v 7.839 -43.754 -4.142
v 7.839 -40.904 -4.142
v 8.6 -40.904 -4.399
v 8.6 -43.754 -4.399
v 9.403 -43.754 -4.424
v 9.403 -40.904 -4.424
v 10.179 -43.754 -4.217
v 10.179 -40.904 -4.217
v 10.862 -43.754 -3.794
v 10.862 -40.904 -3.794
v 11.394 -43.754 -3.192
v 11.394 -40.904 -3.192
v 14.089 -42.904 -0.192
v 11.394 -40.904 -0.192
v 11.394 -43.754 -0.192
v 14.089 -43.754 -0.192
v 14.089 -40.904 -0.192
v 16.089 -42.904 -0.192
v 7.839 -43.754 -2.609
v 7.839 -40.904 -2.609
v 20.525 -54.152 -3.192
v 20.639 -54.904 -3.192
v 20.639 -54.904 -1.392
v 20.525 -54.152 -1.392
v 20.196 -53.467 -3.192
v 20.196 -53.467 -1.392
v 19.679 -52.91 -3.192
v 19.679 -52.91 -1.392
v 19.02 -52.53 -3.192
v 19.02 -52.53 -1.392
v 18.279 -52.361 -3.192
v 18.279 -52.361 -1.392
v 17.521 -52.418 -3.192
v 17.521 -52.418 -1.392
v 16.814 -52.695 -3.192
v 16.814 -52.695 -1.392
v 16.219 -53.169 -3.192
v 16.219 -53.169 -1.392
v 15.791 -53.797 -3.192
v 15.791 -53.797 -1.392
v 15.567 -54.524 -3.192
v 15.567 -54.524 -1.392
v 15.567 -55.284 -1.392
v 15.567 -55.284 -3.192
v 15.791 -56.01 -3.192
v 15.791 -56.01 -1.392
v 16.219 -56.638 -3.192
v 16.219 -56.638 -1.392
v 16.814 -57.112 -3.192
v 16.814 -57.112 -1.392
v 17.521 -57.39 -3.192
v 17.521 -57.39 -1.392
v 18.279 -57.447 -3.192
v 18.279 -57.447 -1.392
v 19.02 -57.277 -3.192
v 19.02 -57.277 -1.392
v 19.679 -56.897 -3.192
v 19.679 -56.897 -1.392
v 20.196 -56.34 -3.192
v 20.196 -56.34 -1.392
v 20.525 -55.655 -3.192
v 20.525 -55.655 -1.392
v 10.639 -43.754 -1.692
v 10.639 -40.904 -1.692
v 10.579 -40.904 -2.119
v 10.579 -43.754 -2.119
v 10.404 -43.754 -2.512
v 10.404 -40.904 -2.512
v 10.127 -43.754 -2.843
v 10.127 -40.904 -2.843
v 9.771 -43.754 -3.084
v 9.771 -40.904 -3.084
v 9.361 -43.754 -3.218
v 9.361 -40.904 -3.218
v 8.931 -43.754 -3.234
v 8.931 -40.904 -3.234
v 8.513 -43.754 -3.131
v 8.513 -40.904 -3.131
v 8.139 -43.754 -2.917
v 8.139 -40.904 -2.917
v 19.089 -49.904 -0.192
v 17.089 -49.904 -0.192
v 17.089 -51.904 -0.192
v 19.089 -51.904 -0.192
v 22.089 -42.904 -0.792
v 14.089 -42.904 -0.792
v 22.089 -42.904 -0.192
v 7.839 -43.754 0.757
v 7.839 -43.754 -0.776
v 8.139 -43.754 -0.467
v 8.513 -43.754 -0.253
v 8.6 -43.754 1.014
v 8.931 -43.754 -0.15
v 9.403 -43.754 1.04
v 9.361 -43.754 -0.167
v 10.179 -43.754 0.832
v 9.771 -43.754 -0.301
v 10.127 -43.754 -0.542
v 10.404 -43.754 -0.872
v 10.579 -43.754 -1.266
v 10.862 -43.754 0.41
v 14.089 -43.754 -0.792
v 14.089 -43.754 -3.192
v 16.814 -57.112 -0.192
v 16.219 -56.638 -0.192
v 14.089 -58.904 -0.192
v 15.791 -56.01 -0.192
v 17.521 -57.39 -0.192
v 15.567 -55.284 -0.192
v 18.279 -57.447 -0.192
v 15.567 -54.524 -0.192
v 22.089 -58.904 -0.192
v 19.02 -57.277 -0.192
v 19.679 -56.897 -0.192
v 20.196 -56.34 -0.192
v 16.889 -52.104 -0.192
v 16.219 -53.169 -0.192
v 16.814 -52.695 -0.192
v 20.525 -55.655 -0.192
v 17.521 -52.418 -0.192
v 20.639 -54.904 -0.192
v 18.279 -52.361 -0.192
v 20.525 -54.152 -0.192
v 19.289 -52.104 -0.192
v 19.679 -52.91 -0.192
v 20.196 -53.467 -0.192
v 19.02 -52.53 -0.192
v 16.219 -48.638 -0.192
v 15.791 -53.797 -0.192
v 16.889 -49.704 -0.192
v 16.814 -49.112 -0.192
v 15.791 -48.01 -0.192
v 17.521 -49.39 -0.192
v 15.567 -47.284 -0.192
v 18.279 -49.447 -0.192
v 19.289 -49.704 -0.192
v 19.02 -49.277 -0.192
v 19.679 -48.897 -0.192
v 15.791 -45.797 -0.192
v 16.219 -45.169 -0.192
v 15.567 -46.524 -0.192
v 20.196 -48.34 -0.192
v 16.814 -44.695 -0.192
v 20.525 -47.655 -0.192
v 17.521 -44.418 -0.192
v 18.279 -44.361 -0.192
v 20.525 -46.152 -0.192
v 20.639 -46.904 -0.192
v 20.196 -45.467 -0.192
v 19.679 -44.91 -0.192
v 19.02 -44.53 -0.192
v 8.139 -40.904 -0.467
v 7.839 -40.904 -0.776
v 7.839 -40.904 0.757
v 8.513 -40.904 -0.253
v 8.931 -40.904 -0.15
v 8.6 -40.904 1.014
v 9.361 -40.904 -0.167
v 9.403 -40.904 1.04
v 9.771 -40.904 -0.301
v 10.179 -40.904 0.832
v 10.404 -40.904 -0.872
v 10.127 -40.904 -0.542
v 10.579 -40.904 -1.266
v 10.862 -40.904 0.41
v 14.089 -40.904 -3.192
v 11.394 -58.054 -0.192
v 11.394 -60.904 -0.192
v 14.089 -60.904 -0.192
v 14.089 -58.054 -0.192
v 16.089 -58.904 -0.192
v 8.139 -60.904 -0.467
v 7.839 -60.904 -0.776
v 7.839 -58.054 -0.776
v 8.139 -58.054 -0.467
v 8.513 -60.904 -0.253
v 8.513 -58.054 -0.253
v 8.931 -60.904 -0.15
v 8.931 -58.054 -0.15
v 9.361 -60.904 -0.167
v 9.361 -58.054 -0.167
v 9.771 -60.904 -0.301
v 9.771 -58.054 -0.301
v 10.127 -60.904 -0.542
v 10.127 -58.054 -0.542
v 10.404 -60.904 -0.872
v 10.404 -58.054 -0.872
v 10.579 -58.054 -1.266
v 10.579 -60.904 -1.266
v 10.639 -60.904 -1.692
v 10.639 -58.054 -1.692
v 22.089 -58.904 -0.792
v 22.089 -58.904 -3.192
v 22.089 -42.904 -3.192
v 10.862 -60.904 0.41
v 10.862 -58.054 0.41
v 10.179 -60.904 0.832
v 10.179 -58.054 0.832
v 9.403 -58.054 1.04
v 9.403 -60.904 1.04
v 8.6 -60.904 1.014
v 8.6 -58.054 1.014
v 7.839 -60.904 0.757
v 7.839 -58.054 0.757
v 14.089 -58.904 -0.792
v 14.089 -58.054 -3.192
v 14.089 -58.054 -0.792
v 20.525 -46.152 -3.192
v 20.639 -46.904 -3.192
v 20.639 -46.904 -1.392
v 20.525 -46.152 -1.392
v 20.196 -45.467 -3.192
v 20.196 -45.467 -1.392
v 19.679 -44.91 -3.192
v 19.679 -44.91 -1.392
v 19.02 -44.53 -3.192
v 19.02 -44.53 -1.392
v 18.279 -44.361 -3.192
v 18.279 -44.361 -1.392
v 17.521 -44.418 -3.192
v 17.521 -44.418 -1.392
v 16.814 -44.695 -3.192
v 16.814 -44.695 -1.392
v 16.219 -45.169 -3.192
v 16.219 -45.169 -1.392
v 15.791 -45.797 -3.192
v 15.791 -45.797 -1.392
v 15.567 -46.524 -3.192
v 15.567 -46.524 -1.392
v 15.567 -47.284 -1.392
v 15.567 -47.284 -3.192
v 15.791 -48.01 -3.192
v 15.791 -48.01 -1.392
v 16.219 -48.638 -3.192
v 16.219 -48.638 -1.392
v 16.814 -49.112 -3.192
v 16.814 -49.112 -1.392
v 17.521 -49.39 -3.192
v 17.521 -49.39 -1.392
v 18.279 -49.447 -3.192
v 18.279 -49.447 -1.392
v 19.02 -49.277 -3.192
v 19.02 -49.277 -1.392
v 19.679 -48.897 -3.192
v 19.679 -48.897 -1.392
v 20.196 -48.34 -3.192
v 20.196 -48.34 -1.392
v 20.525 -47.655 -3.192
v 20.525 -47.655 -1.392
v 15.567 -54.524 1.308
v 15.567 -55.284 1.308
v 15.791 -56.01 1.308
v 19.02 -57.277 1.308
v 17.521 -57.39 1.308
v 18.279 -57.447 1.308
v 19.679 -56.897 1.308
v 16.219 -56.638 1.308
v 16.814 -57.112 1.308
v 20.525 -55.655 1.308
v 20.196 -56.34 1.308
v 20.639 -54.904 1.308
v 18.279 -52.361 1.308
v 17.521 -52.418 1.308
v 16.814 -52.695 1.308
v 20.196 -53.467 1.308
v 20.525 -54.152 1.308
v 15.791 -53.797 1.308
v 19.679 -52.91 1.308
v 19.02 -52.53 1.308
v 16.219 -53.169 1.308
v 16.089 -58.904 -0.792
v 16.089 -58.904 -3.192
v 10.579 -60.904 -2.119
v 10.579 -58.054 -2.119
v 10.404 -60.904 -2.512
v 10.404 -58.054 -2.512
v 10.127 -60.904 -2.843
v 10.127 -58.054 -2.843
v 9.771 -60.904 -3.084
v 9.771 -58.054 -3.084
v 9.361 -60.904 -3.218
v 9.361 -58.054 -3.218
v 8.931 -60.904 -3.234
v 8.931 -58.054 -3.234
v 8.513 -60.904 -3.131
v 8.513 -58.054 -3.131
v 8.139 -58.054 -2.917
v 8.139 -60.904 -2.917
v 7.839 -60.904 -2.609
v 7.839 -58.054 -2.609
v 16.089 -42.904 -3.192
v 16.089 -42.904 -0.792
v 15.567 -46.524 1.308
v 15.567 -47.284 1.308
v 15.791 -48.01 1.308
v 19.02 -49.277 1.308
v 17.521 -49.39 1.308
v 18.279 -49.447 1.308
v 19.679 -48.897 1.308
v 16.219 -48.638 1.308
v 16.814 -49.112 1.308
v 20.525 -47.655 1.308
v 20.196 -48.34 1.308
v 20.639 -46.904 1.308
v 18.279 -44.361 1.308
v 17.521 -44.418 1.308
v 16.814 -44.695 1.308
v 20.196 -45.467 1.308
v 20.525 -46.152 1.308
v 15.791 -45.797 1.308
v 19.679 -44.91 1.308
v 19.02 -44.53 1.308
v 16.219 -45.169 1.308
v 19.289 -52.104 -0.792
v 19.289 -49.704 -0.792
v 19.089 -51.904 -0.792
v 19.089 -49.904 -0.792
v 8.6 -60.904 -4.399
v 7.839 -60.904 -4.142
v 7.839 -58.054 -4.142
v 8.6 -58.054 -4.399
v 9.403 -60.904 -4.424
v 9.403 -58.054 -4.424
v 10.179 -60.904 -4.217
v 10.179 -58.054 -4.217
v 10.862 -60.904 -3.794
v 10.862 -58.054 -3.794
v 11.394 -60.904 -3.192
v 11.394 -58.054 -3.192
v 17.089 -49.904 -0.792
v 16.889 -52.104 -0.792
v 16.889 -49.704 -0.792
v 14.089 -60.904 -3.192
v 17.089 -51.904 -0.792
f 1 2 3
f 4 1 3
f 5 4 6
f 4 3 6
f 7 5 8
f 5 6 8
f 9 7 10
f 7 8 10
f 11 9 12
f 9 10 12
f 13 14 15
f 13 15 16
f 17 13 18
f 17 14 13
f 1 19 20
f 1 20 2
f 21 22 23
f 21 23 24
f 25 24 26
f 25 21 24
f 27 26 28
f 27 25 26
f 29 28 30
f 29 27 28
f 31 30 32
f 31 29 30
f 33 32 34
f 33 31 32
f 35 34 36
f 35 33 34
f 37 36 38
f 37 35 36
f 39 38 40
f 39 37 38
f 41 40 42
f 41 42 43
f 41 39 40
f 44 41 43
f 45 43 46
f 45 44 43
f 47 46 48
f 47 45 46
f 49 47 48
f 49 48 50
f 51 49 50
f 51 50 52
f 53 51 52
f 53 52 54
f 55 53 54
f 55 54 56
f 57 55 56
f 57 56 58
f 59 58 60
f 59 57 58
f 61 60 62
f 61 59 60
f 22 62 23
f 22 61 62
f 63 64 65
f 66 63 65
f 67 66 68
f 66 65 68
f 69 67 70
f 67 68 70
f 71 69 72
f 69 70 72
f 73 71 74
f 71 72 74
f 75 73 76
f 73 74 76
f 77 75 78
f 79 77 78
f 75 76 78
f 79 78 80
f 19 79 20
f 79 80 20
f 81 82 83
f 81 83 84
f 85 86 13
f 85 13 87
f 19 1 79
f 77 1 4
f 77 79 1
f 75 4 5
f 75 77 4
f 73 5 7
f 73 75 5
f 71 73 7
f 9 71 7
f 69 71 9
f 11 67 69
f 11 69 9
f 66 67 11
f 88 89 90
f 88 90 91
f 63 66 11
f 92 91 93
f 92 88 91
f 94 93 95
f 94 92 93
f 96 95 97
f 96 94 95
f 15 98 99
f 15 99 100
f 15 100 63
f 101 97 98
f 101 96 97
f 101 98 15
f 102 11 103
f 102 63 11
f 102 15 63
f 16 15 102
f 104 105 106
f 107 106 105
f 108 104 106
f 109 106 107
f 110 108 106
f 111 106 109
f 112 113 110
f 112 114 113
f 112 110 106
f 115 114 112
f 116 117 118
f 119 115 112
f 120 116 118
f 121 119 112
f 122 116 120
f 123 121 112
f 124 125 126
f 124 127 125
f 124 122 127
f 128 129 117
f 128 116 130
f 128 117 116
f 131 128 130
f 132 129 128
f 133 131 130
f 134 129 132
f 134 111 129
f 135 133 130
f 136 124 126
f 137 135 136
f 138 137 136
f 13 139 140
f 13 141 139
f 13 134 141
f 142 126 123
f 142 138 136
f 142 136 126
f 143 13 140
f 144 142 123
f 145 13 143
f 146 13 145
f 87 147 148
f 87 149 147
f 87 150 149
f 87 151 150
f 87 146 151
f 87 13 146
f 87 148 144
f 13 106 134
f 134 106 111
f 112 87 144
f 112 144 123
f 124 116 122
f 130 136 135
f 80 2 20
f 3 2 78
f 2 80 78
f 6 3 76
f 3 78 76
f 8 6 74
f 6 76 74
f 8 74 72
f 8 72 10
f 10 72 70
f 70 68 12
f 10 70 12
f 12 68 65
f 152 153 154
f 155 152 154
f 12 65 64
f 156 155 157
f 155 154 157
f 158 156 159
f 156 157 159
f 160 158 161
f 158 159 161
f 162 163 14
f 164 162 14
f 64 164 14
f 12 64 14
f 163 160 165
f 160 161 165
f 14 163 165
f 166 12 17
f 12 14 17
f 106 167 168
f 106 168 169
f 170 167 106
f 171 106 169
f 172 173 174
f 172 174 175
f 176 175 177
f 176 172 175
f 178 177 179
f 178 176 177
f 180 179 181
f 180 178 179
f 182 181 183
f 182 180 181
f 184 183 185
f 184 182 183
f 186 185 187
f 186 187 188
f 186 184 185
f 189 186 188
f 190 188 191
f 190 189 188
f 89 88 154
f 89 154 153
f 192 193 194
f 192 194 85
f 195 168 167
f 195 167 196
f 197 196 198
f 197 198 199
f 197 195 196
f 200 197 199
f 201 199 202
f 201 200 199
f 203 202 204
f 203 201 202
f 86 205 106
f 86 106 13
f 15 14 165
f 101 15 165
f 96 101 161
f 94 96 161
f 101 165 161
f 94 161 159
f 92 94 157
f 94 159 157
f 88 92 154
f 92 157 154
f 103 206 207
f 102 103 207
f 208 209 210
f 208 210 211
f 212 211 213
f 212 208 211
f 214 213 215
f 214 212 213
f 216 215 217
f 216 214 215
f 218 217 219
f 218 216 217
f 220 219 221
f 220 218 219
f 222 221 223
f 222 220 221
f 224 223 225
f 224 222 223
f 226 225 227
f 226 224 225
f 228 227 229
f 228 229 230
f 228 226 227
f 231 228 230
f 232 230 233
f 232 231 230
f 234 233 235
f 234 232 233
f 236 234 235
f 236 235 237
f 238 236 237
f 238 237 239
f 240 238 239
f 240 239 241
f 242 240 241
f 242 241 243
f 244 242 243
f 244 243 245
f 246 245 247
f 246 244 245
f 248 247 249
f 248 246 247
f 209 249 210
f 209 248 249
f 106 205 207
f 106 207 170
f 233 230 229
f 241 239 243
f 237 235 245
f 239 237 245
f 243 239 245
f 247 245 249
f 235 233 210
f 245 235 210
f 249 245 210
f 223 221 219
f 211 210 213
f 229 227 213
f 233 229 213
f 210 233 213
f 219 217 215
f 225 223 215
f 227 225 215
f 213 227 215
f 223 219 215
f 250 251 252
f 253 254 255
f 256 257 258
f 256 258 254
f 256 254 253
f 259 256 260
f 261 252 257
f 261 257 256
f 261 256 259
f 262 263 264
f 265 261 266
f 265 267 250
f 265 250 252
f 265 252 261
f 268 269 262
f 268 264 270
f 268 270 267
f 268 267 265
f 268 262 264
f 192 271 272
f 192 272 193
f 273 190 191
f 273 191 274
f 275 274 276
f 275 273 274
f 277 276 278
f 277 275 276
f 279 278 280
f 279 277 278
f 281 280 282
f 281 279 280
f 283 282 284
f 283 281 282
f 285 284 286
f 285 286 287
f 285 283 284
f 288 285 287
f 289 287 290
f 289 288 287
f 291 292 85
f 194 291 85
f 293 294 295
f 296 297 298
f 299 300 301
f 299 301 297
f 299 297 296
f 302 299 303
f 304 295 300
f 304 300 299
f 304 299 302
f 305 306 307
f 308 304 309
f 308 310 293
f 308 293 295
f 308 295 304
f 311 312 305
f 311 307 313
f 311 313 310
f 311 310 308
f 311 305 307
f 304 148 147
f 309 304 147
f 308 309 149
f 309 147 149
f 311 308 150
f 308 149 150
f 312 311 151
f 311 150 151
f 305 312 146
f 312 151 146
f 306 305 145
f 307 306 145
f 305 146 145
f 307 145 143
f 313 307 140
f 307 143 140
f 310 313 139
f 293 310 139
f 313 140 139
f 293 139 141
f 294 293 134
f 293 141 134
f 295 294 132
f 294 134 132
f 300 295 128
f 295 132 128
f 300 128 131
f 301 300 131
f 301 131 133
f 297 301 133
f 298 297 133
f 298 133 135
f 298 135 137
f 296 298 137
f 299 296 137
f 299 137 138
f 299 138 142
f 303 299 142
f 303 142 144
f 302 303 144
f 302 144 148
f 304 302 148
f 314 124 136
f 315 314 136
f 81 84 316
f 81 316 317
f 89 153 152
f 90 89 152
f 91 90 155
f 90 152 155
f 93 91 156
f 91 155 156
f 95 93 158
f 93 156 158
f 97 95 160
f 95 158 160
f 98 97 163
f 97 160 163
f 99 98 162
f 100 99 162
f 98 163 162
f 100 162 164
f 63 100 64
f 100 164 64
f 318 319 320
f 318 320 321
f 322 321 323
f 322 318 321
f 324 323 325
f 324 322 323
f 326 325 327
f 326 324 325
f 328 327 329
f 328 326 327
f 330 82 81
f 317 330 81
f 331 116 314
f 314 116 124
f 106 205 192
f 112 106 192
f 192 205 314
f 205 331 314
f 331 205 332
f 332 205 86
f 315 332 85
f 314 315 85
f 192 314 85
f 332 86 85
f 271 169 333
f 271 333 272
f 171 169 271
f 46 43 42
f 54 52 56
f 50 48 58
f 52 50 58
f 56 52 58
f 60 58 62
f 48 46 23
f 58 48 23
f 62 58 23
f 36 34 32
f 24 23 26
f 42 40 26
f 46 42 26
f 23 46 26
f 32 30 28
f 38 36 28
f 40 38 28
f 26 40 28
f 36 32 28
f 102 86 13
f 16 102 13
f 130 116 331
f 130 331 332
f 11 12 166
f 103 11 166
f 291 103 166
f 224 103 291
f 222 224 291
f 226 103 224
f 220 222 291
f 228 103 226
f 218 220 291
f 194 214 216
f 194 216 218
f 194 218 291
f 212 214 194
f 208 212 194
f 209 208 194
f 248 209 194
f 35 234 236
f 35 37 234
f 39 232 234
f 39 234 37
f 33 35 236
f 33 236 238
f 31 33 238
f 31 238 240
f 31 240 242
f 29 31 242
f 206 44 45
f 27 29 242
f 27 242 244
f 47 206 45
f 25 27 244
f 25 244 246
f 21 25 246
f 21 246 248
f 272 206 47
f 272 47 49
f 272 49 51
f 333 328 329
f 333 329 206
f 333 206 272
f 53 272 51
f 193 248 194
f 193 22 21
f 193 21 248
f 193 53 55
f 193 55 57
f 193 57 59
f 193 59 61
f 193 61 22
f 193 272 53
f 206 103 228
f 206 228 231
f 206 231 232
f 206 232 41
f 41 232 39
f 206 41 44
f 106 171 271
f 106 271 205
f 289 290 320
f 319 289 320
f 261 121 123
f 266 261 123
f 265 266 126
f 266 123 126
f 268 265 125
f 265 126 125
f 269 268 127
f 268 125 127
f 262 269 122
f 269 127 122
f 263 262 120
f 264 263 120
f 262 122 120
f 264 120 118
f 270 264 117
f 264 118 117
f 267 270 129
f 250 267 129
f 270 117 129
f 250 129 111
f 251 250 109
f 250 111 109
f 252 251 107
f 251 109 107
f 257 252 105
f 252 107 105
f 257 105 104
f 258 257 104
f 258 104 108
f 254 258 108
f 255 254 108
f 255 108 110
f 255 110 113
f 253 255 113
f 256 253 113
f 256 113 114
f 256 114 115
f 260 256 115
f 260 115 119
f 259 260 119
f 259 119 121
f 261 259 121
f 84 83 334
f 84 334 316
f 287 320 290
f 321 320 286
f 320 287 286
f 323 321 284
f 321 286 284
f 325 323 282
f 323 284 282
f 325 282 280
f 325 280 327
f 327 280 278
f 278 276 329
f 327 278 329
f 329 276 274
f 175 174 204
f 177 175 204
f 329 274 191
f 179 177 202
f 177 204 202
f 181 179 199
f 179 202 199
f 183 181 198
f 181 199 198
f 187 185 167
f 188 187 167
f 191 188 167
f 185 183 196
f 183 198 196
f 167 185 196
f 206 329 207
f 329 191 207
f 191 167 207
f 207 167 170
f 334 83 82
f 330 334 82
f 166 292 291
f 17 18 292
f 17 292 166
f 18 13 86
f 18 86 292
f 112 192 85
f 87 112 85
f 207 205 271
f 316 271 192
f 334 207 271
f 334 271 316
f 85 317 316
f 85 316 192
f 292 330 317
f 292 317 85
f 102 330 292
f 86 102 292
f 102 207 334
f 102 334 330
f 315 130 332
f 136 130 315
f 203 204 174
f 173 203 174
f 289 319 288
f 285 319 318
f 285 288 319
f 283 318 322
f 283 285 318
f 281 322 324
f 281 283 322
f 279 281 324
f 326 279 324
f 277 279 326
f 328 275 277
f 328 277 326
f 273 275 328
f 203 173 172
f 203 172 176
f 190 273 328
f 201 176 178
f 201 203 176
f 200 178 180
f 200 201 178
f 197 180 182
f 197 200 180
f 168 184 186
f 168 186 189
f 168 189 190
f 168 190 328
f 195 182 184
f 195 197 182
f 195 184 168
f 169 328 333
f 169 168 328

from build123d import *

# Parameters (mm, degrees)
BOSS_EXTRUDE1_DEPTH = 2.85
BOSS_EXTRUDE2_START = -10
SKETCH1_3_W         = 8
SKETCH1_3_H         = 3
BOSS_EXTRUDE2_DEPTH = 8
SKETCH2_R           = 2.55
BOSS_EXTRUDE3_DEPTH = 1.5
CUT_EXTRUDE1_START  = -3
SKETCH2_4_R         = 2.55
CUT_EXTRUDE1_DEPTH  = 1.8
SPLIT1_START        = -0.792385575
SPLIT1_OUTLINE_R    = 2.55
SPLIT1_DEPTH        = 2.1
SPLIT1_2_OUTLINE_W  = 8
SPLIT1_2_OUTLINE_H  = 16
SPLIT1_2_OUTLINE_R  = 2.55
SPLIT1_2_DEPTH      = 0.6
SPLIT1_START_2      = 14.088625645
SPLIT1_3_OUTLINE_W  = 16
SPLIT1_3_OUTLINE_H  = 2.1
SPLIT1_3_DEPTH      = 8
SKETCH3_W           = 2.4
SKETCH3_H           = 2.4
SKETCH3_W_2         = 2
SKETCH3_H_2         = 2
CUT_EXTRUDE2_DEPTH  = 65.924847621
BOSS_EXTRUDE4_REACH = 66.925
SKETCH3_3_W         = 2
SKETCH3_3_H         = 2
BOSS_EXTRUDE5_REACH = 66.925


# Read off the part's stored shape, not the designer's step: Split1
with BuildPart() as part:
    # Sketch1 → Boss-Extrude1 (new body)
    with BuildSketch(Plane.XZ.offset(60.903743363)):
        with BuildLine():
            ThreePointArc((11.39351176, -0.192385575), (9.798258558, 0.964477449), (7.838625645, 0.757104168))
            Line((7.838625645, 0.757104168), (7.838625645, -0.775870436))
            ThreePointArc((7.838625645, -0.775870436), (9.570808183, -0.219293589), (10.638625645, -1.692385575))
            ThreePointArc((10.638625645, -1.692385575), (9.570808183, -3.165477561), (7.838625645, -2.608900714))
            Line((7.838625645, -2.608900714), (7.838625645, -4.141875318))
            ThreePointArc((7.838625645, -4.141875318), (9.798258558, -4.349248599), (11.39351176, -3.192385575))
            ThreePointArc((11.39351176, -3.192385575), (11.724999748, -2.474710055), (11.838625645, -1.692385575))
            ThreePointArc((11.838625645, -1.692385575), (11.724999748, -0.910061094), (11.39351176, -0.192385575))
        make_face()
        with BuildLine():
            Line((14.088625645, -0.192385575), (11.39351176, -0.192385575))
            ThreePointArc((11.39351176, -0.192385575), (11.724999748, -0.910061094), (11.838625645, -1.692385575))
            ThreePointArc((11.838625645, -1.692385575), (11.724999748, -2.474710055), (11.39351176, -3.192385575))
            Line((11.39351176, -3.192385575), (14.088625645, -3.192385575))
            Line((14.088625645, -3.192385575), (14.088625645, -0.192385575))
        make_face()
    extrude(amount=-BOSS_EXTRUDE1_DEPTH)


with BuildPart() as body_2:
    # Mirror3: mirrored copy
    add(part.part.mirror(Plane(origin=(0, -50.903743363, 0), x_dir=(0, 0, 1), z_dir=(0, -1, 0))))


with BuildPart() as part_1:
    add(part.part)

    add(body_2.part)  # Boss-Extrude2 merges body 2
    # Sketch1<3> → Boss-Extrude2 (add, symmetric)
    with BuildSketch(Plane.XZ.offset(60.903743363).offset(BOSS_EXTRUDE2_START)):
        with Locations((18.088625645, -1.692385575)):
            Rectangle(SKETCH1_3_W, SKETCH1_3_H)
    extrude(amount=BOSS_EXTRUDE2_DEPTH, both=True)

    # Sketch2 → Boss-Extrude3 (add)
    with BuildSketch(Plane.XY.offset(-0.192385575)):
        with Locations((18.088625645, -54.903743363)):
            Circle(SKETCH2_R)
        with Locations((18.088625645, -46.903743363)):
            Circle(SKETCH2_R)
    extrude(amount=BOSS_EXTRUDE3_DEPTH)

    # Sketch2<4> → Cut-Extrude1 (cut)
    with BuildSketch(Plane.XY.offset(-0.192385575).offset(CUT_EXTRUDE1_START)):
        with Locations((18.088625645, -54.903743363)):
            Circle(SKETCH2_4_R)
        with Locations((18.088625645, -46.903743363)):
            Circle(SKETCH2_4_R)
    extrude(amount=CUT_EXTRUDE1_DEPTH, mode=Mode.SUBTRACT)

    # Split1 3 outline → Split1 3 (cut)
    with BuildSketch(Plane.YZ.offset(SPLIT1_START_2)):
        with Locations((-50.903743363, 0.257614425)):
            Rectangle(SPLIT1_3_OUTLINE_W, SPLIT1_3_OUTLINE_H)
    extrude(amount=SPLIT1_3_DEPTH, mode=Mode.SUBTRACT)

    # Sketch3<3> → Boss-Extrude4 (add, up to next)
    with BuildSketch(Plane.XY.offset(-0.192385575), mode=Mode.PRIVATE) as boss_extrude4_sk1:
        with Locations((18.088625645, -50.903743363)):
            Rectangle(SKETCH3_3_W, SKETCH3_3_H)
    boss_extrude4_tool1 = extrude(boss_extrude4_sk1.sketch, amount=-BOSS_EXTRUDE4_REACH, mode=Mode.PRIVATE) - part_1.part
    add(boss_extrude4_tool1.solids().sort_by_distance((18.088626, -50.903743, -0.192386))[0])

    # Boss-Extrude5: up to this face of the body (flat: up to its plane)
    boss_extrude5_end = Plane(part_1.part.faces().sort_by_distance((17.287207403, -50.903743363, -3.192385575))[0])
    # Sketch2<6> → Boss-Extrude5 (add, up to the picked face)
    with BuildSketch(Plane.XY.offset(-0.192385575), mode=Mode.PRIVATE) as boss_extrude5_sk1:
        Polygon((14.088625645, -58.903743363), (14.088625645, -60.903743363), (16.088625645, -58.903743363), align=None)
    boss_extrude5_tool1 = split(extrude(boss_extrude5_sk1.sketch, amount=-BOSS_EXTRUDE5_REACH, mode=Mode.PRIVATE), bisect_by=boss_extrude5_end, keep=Keep.BOTH, mode=Mode.PRIVATE)
    # Sketch2<6> → Boss-Extrude5 (add, up to the picked face)
    with BuildSketch(Plane.XY.offset(-0.192385575), mode=Mode.PRIVATE) as boss_extrude5_sk2:
        Polygon((16.088625645, -42.903743363), (14.088625645, -40.903743363), (14.088625645, -42.903743363), align=None)
    boss_extrude5_tool2 = split(extrude(boss_extrude5_sk2.sketch, amount=-BOSS_EXTRUDE5_REACH, mode=Mode.PRIVATE), bisect_by=boss_extrude5_end, keep=Keep.BOTH, mode=Mode.PRIVATE)
    add(boss_extrude5_tool1.solids().sort_by(Axis((14.755292, -59.57041, -0.192386), (0, 0, -1)))[0])
    add(boss_extrude5_tool2.solids().sort_by(Axis((14.755292, -42.237077, -0.192386), (0, 0, -1)))[0])


with BuildPart() as body_2_2:
    # Split1 outline → Split1 (new body)
    with BuildSketch(Plane.XY.offset(SPLIT1_START)):
        with Locations((18.088625645, -46.903743363)):
            Circle(SPLIT1_OUTLINE_R)
        with Locations((18.088625645, -54.903743363)):
            Circle(SPLIT1_OUTLINE_R)
    extrude(amount=SPLIT1_DEPTH)

    # Split1 2 outline → Split1 2 (add)
    with BuildSketch(Plane.XY.offset(SPLIT1_START)):
        with Locations((18.088625645, -50.903743363)):
            Rectangle(SPLIT1_2_OUTLINE_W, SPLIT1_2_OUTLINE_H)
        with Locations((18.088625645, -54.903743363)):
            Circle(SPLIT1_2_OUTLINE_R, mode=Mode.SUBTRACT)
        with Locations((18.088625645, -46.903743363)):
            Circle(SPLIT1_2_OUTLINE_R, mode=Mode.SUBTRACT)
    extrude(amount=SPLIT1_2_DEPTH)

    # Sketch3 → Cut-Extrude2 (cut, through all)
    with BuildSketch(Plane.XY.offset(-0.192385575)):
        with Locations((18.088625645, -50.903743363)):
            Rectangle(SKETCH3_W, SKETCH3_H)
        with Locations((18.088625645, -50.903743363)):
            Rectangle(SKETCH3_W_2, SKETCH3_H_2, mode=Mode.SUBTRACT)
    extrude(amount=-CUT_EXTRUDE2_DEPTH, mode=Mode.SUBTRACT)


with BuildPart() as cut_extrude2_kept_piece:
    # of the separate pieces the step leaves, the one the design keeps (cut_extrude2_pieces_kept)
    add(body_2_2.part.solids().sort_by_distance((20.638625645, -46.903743363, -0.192385575))[0])


solid = Compound([part_1.part, cut_extrude2_kept_piece.part])
